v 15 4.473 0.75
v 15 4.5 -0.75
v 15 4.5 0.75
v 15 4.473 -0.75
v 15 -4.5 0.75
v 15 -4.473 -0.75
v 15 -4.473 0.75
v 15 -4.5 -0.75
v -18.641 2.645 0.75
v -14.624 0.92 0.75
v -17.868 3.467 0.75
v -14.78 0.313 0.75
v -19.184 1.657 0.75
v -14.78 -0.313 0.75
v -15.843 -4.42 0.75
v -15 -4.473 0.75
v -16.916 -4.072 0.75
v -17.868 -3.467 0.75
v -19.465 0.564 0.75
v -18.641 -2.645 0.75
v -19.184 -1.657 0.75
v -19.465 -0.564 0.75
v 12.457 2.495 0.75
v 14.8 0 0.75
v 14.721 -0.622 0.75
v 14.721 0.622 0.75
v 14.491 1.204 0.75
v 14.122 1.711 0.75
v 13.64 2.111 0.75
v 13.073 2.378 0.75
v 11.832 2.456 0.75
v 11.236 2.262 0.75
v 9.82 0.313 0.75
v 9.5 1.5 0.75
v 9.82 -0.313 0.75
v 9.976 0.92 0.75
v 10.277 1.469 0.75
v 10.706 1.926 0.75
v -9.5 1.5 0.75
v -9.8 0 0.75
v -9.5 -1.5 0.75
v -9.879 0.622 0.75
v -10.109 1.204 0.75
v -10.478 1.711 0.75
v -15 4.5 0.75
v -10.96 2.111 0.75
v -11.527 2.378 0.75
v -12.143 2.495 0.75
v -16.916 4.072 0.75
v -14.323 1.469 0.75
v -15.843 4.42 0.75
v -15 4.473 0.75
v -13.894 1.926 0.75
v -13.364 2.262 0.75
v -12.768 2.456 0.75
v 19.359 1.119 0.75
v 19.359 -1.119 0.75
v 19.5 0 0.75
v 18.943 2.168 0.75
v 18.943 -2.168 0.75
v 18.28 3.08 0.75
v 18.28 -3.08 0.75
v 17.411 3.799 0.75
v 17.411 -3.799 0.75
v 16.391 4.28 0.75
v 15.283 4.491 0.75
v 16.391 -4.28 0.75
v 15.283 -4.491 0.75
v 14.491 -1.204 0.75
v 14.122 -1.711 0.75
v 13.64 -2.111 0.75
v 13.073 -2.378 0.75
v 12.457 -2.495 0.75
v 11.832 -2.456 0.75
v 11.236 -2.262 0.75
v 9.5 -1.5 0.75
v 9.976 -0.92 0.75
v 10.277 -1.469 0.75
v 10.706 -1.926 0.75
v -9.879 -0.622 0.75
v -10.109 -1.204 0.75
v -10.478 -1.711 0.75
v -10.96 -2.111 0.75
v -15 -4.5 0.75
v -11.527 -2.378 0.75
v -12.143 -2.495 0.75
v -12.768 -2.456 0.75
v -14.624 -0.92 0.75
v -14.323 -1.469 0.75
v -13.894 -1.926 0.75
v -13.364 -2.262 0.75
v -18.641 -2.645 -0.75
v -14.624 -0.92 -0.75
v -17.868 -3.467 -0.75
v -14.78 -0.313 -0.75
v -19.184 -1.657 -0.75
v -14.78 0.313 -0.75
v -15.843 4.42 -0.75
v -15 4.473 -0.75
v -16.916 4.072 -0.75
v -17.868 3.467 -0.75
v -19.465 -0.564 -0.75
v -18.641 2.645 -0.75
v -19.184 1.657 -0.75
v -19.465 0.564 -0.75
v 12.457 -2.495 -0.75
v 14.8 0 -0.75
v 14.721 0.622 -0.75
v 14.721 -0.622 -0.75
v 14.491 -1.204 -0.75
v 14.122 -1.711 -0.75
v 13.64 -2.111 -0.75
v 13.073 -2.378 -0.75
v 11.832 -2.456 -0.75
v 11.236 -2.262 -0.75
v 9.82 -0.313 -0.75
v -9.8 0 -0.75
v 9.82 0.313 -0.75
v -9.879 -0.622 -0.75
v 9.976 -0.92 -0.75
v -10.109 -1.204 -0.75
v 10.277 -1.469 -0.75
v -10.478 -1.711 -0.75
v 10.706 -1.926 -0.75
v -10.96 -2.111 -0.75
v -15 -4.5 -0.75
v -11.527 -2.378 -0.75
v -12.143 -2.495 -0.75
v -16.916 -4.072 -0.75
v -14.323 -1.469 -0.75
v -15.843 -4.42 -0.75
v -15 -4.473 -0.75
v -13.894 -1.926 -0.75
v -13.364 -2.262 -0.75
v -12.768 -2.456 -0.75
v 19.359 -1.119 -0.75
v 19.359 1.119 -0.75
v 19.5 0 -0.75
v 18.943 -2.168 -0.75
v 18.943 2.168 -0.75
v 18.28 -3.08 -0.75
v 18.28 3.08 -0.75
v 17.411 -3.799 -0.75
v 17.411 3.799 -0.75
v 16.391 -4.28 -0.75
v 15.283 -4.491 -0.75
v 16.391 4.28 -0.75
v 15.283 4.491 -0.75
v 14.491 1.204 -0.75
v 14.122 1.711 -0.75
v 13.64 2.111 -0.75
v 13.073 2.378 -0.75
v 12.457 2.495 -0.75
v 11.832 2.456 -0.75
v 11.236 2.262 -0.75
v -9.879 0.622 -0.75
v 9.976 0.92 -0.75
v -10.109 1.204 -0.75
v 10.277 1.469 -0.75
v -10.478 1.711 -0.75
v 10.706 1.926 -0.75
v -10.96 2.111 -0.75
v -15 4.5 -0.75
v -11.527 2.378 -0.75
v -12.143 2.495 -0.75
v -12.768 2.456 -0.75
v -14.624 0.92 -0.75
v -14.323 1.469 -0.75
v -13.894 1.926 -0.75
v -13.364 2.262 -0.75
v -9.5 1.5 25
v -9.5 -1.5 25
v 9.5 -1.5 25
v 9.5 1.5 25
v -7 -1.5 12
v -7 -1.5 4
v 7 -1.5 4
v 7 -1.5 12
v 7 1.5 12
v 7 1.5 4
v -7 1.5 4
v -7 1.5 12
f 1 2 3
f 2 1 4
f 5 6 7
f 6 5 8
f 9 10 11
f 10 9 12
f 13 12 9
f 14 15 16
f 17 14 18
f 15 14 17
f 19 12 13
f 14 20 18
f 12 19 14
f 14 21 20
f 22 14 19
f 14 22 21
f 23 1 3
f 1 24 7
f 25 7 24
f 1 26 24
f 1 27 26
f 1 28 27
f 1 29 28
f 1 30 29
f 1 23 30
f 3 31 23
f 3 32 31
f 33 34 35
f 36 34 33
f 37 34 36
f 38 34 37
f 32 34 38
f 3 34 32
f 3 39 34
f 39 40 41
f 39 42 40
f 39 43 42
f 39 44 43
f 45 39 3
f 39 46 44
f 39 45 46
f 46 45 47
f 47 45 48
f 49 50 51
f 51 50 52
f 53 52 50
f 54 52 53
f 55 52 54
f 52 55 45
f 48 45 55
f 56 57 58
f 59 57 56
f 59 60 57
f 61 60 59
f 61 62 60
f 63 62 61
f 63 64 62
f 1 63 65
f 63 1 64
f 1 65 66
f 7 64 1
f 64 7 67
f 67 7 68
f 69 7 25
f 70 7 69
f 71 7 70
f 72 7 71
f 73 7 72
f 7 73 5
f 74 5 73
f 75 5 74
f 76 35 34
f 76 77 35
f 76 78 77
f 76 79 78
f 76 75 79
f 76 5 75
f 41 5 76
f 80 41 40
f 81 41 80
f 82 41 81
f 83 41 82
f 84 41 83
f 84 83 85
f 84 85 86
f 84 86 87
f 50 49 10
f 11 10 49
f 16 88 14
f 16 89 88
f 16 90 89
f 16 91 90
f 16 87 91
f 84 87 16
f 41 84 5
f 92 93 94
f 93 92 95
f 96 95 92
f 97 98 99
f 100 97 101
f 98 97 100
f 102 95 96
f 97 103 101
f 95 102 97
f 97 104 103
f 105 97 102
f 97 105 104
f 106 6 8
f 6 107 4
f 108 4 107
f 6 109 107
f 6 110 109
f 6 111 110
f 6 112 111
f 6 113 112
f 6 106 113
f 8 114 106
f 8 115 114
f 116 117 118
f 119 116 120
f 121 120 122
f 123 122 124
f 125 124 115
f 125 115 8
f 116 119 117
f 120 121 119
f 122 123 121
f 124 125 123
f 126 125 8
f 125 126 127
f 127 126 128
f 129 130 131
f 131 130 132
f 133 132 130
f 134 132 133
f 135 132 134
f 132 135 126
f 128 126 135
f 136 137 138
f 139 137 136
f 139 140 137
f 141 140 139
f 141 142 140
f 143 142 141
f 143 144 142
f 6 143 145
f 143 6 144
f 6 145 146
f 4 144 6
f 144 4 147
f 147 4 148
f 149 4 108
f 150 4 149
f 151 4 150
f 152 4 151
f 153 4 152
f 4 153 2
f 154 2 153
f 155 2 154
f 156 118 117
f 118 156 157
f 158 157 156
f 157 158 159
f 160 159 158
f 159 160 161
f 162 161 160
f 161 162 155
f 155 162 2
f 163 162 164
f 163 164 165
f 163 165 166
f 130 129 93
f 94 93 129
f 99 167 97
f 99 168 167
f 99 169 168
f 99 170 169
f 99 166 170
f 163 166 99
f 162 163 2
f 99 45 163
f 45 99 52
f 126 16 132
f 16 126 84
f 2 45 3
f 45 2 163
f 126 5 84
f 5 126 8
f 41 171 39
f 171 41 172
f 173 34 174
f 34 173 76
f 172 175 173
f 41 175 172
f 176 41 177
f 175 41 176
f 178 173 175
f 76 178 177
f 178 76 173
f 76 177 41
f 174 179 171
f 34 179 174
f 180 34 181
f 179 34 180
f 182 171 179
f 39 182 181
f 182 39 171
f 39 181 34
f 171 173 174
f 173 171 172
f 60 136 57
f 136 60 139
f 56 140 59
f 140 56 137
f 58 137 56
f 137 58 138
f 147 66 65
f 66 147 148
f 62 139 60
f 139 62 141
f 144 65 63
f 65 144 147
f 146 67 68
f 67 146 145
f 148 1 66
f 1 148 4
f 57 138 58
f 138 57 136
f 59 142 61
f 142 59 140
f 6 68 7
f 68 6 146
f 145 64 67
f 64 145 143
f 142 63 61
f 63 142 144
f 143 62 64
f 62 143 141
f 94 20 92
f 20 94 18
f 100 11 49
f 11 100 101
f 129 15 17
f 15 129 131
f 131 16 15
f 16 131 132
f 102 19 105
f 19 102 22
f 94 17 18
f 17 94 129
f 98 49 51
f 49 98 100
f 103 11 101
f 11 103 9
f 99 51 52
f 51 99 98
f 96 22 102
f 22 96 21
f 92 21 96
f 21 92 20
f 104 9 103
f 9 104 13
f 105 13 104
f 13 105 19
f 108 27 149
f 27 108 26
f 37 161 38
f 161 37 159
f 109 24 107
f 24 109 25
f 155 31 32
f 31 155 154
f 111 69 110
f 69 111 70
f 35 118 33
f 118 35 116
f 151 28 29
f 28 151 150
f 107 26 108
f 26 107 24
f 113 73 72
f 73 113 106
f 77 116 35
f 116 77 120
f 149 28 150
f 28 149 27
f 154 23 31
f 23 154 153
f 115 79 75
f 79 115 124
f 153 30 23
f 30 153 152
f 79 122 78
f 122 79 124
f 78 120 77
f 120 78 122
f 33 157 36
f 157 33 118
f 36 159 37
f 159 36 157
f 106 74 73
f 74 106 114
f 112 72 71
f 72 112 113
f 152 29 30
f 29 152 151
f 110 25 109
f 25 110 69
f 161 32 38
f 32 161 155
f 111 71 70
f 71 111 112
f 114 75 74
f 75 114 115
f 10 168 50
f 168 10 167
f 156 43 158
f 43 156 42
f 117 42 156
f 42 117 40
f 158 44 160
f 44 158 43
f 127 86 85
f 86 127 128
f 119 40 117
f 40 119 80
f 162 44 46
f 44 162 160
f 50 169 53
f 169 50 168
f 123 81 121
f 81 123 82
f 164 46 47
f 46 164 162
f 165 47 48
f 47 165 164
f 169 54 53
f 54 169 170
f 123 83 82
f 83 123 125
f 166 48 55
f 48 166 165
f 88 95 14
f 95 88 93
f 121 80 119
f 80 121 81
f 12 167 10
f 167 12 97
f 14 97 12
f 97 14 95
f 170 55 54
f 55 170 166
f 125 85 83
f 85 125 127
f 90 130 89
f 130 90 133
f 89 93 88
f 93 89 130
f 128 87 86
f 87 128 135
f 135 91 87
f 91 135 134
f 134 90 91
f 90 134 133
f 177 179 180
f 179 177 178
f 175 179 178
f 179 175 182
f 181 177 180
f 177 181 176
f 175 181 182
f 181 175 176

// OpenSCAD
$fn=25;

difference() {
    union() {
        
        
        cube([30,9,1.5],true);

        translate([0,0,12.5])
            rotate([90,0,0])
                cube([19,25,3],true);

        translate([15,0,0])
            cylinder(1.5,4.5,4.5,true);
            
         translate([-15,0,0])
            cylinder(1.5,4.5,4.5,true);
    }
        
    union() {
        translate([12.3,0,0])
            cylinder(10,2.5,2.5,true);
            
         translate([-12.3,0,0])
            cylinder(10,2.5,2.5,true);
            
         translate([0,0,8])
            cube([14,30,8],true);
        
    }
}
        
    
 
